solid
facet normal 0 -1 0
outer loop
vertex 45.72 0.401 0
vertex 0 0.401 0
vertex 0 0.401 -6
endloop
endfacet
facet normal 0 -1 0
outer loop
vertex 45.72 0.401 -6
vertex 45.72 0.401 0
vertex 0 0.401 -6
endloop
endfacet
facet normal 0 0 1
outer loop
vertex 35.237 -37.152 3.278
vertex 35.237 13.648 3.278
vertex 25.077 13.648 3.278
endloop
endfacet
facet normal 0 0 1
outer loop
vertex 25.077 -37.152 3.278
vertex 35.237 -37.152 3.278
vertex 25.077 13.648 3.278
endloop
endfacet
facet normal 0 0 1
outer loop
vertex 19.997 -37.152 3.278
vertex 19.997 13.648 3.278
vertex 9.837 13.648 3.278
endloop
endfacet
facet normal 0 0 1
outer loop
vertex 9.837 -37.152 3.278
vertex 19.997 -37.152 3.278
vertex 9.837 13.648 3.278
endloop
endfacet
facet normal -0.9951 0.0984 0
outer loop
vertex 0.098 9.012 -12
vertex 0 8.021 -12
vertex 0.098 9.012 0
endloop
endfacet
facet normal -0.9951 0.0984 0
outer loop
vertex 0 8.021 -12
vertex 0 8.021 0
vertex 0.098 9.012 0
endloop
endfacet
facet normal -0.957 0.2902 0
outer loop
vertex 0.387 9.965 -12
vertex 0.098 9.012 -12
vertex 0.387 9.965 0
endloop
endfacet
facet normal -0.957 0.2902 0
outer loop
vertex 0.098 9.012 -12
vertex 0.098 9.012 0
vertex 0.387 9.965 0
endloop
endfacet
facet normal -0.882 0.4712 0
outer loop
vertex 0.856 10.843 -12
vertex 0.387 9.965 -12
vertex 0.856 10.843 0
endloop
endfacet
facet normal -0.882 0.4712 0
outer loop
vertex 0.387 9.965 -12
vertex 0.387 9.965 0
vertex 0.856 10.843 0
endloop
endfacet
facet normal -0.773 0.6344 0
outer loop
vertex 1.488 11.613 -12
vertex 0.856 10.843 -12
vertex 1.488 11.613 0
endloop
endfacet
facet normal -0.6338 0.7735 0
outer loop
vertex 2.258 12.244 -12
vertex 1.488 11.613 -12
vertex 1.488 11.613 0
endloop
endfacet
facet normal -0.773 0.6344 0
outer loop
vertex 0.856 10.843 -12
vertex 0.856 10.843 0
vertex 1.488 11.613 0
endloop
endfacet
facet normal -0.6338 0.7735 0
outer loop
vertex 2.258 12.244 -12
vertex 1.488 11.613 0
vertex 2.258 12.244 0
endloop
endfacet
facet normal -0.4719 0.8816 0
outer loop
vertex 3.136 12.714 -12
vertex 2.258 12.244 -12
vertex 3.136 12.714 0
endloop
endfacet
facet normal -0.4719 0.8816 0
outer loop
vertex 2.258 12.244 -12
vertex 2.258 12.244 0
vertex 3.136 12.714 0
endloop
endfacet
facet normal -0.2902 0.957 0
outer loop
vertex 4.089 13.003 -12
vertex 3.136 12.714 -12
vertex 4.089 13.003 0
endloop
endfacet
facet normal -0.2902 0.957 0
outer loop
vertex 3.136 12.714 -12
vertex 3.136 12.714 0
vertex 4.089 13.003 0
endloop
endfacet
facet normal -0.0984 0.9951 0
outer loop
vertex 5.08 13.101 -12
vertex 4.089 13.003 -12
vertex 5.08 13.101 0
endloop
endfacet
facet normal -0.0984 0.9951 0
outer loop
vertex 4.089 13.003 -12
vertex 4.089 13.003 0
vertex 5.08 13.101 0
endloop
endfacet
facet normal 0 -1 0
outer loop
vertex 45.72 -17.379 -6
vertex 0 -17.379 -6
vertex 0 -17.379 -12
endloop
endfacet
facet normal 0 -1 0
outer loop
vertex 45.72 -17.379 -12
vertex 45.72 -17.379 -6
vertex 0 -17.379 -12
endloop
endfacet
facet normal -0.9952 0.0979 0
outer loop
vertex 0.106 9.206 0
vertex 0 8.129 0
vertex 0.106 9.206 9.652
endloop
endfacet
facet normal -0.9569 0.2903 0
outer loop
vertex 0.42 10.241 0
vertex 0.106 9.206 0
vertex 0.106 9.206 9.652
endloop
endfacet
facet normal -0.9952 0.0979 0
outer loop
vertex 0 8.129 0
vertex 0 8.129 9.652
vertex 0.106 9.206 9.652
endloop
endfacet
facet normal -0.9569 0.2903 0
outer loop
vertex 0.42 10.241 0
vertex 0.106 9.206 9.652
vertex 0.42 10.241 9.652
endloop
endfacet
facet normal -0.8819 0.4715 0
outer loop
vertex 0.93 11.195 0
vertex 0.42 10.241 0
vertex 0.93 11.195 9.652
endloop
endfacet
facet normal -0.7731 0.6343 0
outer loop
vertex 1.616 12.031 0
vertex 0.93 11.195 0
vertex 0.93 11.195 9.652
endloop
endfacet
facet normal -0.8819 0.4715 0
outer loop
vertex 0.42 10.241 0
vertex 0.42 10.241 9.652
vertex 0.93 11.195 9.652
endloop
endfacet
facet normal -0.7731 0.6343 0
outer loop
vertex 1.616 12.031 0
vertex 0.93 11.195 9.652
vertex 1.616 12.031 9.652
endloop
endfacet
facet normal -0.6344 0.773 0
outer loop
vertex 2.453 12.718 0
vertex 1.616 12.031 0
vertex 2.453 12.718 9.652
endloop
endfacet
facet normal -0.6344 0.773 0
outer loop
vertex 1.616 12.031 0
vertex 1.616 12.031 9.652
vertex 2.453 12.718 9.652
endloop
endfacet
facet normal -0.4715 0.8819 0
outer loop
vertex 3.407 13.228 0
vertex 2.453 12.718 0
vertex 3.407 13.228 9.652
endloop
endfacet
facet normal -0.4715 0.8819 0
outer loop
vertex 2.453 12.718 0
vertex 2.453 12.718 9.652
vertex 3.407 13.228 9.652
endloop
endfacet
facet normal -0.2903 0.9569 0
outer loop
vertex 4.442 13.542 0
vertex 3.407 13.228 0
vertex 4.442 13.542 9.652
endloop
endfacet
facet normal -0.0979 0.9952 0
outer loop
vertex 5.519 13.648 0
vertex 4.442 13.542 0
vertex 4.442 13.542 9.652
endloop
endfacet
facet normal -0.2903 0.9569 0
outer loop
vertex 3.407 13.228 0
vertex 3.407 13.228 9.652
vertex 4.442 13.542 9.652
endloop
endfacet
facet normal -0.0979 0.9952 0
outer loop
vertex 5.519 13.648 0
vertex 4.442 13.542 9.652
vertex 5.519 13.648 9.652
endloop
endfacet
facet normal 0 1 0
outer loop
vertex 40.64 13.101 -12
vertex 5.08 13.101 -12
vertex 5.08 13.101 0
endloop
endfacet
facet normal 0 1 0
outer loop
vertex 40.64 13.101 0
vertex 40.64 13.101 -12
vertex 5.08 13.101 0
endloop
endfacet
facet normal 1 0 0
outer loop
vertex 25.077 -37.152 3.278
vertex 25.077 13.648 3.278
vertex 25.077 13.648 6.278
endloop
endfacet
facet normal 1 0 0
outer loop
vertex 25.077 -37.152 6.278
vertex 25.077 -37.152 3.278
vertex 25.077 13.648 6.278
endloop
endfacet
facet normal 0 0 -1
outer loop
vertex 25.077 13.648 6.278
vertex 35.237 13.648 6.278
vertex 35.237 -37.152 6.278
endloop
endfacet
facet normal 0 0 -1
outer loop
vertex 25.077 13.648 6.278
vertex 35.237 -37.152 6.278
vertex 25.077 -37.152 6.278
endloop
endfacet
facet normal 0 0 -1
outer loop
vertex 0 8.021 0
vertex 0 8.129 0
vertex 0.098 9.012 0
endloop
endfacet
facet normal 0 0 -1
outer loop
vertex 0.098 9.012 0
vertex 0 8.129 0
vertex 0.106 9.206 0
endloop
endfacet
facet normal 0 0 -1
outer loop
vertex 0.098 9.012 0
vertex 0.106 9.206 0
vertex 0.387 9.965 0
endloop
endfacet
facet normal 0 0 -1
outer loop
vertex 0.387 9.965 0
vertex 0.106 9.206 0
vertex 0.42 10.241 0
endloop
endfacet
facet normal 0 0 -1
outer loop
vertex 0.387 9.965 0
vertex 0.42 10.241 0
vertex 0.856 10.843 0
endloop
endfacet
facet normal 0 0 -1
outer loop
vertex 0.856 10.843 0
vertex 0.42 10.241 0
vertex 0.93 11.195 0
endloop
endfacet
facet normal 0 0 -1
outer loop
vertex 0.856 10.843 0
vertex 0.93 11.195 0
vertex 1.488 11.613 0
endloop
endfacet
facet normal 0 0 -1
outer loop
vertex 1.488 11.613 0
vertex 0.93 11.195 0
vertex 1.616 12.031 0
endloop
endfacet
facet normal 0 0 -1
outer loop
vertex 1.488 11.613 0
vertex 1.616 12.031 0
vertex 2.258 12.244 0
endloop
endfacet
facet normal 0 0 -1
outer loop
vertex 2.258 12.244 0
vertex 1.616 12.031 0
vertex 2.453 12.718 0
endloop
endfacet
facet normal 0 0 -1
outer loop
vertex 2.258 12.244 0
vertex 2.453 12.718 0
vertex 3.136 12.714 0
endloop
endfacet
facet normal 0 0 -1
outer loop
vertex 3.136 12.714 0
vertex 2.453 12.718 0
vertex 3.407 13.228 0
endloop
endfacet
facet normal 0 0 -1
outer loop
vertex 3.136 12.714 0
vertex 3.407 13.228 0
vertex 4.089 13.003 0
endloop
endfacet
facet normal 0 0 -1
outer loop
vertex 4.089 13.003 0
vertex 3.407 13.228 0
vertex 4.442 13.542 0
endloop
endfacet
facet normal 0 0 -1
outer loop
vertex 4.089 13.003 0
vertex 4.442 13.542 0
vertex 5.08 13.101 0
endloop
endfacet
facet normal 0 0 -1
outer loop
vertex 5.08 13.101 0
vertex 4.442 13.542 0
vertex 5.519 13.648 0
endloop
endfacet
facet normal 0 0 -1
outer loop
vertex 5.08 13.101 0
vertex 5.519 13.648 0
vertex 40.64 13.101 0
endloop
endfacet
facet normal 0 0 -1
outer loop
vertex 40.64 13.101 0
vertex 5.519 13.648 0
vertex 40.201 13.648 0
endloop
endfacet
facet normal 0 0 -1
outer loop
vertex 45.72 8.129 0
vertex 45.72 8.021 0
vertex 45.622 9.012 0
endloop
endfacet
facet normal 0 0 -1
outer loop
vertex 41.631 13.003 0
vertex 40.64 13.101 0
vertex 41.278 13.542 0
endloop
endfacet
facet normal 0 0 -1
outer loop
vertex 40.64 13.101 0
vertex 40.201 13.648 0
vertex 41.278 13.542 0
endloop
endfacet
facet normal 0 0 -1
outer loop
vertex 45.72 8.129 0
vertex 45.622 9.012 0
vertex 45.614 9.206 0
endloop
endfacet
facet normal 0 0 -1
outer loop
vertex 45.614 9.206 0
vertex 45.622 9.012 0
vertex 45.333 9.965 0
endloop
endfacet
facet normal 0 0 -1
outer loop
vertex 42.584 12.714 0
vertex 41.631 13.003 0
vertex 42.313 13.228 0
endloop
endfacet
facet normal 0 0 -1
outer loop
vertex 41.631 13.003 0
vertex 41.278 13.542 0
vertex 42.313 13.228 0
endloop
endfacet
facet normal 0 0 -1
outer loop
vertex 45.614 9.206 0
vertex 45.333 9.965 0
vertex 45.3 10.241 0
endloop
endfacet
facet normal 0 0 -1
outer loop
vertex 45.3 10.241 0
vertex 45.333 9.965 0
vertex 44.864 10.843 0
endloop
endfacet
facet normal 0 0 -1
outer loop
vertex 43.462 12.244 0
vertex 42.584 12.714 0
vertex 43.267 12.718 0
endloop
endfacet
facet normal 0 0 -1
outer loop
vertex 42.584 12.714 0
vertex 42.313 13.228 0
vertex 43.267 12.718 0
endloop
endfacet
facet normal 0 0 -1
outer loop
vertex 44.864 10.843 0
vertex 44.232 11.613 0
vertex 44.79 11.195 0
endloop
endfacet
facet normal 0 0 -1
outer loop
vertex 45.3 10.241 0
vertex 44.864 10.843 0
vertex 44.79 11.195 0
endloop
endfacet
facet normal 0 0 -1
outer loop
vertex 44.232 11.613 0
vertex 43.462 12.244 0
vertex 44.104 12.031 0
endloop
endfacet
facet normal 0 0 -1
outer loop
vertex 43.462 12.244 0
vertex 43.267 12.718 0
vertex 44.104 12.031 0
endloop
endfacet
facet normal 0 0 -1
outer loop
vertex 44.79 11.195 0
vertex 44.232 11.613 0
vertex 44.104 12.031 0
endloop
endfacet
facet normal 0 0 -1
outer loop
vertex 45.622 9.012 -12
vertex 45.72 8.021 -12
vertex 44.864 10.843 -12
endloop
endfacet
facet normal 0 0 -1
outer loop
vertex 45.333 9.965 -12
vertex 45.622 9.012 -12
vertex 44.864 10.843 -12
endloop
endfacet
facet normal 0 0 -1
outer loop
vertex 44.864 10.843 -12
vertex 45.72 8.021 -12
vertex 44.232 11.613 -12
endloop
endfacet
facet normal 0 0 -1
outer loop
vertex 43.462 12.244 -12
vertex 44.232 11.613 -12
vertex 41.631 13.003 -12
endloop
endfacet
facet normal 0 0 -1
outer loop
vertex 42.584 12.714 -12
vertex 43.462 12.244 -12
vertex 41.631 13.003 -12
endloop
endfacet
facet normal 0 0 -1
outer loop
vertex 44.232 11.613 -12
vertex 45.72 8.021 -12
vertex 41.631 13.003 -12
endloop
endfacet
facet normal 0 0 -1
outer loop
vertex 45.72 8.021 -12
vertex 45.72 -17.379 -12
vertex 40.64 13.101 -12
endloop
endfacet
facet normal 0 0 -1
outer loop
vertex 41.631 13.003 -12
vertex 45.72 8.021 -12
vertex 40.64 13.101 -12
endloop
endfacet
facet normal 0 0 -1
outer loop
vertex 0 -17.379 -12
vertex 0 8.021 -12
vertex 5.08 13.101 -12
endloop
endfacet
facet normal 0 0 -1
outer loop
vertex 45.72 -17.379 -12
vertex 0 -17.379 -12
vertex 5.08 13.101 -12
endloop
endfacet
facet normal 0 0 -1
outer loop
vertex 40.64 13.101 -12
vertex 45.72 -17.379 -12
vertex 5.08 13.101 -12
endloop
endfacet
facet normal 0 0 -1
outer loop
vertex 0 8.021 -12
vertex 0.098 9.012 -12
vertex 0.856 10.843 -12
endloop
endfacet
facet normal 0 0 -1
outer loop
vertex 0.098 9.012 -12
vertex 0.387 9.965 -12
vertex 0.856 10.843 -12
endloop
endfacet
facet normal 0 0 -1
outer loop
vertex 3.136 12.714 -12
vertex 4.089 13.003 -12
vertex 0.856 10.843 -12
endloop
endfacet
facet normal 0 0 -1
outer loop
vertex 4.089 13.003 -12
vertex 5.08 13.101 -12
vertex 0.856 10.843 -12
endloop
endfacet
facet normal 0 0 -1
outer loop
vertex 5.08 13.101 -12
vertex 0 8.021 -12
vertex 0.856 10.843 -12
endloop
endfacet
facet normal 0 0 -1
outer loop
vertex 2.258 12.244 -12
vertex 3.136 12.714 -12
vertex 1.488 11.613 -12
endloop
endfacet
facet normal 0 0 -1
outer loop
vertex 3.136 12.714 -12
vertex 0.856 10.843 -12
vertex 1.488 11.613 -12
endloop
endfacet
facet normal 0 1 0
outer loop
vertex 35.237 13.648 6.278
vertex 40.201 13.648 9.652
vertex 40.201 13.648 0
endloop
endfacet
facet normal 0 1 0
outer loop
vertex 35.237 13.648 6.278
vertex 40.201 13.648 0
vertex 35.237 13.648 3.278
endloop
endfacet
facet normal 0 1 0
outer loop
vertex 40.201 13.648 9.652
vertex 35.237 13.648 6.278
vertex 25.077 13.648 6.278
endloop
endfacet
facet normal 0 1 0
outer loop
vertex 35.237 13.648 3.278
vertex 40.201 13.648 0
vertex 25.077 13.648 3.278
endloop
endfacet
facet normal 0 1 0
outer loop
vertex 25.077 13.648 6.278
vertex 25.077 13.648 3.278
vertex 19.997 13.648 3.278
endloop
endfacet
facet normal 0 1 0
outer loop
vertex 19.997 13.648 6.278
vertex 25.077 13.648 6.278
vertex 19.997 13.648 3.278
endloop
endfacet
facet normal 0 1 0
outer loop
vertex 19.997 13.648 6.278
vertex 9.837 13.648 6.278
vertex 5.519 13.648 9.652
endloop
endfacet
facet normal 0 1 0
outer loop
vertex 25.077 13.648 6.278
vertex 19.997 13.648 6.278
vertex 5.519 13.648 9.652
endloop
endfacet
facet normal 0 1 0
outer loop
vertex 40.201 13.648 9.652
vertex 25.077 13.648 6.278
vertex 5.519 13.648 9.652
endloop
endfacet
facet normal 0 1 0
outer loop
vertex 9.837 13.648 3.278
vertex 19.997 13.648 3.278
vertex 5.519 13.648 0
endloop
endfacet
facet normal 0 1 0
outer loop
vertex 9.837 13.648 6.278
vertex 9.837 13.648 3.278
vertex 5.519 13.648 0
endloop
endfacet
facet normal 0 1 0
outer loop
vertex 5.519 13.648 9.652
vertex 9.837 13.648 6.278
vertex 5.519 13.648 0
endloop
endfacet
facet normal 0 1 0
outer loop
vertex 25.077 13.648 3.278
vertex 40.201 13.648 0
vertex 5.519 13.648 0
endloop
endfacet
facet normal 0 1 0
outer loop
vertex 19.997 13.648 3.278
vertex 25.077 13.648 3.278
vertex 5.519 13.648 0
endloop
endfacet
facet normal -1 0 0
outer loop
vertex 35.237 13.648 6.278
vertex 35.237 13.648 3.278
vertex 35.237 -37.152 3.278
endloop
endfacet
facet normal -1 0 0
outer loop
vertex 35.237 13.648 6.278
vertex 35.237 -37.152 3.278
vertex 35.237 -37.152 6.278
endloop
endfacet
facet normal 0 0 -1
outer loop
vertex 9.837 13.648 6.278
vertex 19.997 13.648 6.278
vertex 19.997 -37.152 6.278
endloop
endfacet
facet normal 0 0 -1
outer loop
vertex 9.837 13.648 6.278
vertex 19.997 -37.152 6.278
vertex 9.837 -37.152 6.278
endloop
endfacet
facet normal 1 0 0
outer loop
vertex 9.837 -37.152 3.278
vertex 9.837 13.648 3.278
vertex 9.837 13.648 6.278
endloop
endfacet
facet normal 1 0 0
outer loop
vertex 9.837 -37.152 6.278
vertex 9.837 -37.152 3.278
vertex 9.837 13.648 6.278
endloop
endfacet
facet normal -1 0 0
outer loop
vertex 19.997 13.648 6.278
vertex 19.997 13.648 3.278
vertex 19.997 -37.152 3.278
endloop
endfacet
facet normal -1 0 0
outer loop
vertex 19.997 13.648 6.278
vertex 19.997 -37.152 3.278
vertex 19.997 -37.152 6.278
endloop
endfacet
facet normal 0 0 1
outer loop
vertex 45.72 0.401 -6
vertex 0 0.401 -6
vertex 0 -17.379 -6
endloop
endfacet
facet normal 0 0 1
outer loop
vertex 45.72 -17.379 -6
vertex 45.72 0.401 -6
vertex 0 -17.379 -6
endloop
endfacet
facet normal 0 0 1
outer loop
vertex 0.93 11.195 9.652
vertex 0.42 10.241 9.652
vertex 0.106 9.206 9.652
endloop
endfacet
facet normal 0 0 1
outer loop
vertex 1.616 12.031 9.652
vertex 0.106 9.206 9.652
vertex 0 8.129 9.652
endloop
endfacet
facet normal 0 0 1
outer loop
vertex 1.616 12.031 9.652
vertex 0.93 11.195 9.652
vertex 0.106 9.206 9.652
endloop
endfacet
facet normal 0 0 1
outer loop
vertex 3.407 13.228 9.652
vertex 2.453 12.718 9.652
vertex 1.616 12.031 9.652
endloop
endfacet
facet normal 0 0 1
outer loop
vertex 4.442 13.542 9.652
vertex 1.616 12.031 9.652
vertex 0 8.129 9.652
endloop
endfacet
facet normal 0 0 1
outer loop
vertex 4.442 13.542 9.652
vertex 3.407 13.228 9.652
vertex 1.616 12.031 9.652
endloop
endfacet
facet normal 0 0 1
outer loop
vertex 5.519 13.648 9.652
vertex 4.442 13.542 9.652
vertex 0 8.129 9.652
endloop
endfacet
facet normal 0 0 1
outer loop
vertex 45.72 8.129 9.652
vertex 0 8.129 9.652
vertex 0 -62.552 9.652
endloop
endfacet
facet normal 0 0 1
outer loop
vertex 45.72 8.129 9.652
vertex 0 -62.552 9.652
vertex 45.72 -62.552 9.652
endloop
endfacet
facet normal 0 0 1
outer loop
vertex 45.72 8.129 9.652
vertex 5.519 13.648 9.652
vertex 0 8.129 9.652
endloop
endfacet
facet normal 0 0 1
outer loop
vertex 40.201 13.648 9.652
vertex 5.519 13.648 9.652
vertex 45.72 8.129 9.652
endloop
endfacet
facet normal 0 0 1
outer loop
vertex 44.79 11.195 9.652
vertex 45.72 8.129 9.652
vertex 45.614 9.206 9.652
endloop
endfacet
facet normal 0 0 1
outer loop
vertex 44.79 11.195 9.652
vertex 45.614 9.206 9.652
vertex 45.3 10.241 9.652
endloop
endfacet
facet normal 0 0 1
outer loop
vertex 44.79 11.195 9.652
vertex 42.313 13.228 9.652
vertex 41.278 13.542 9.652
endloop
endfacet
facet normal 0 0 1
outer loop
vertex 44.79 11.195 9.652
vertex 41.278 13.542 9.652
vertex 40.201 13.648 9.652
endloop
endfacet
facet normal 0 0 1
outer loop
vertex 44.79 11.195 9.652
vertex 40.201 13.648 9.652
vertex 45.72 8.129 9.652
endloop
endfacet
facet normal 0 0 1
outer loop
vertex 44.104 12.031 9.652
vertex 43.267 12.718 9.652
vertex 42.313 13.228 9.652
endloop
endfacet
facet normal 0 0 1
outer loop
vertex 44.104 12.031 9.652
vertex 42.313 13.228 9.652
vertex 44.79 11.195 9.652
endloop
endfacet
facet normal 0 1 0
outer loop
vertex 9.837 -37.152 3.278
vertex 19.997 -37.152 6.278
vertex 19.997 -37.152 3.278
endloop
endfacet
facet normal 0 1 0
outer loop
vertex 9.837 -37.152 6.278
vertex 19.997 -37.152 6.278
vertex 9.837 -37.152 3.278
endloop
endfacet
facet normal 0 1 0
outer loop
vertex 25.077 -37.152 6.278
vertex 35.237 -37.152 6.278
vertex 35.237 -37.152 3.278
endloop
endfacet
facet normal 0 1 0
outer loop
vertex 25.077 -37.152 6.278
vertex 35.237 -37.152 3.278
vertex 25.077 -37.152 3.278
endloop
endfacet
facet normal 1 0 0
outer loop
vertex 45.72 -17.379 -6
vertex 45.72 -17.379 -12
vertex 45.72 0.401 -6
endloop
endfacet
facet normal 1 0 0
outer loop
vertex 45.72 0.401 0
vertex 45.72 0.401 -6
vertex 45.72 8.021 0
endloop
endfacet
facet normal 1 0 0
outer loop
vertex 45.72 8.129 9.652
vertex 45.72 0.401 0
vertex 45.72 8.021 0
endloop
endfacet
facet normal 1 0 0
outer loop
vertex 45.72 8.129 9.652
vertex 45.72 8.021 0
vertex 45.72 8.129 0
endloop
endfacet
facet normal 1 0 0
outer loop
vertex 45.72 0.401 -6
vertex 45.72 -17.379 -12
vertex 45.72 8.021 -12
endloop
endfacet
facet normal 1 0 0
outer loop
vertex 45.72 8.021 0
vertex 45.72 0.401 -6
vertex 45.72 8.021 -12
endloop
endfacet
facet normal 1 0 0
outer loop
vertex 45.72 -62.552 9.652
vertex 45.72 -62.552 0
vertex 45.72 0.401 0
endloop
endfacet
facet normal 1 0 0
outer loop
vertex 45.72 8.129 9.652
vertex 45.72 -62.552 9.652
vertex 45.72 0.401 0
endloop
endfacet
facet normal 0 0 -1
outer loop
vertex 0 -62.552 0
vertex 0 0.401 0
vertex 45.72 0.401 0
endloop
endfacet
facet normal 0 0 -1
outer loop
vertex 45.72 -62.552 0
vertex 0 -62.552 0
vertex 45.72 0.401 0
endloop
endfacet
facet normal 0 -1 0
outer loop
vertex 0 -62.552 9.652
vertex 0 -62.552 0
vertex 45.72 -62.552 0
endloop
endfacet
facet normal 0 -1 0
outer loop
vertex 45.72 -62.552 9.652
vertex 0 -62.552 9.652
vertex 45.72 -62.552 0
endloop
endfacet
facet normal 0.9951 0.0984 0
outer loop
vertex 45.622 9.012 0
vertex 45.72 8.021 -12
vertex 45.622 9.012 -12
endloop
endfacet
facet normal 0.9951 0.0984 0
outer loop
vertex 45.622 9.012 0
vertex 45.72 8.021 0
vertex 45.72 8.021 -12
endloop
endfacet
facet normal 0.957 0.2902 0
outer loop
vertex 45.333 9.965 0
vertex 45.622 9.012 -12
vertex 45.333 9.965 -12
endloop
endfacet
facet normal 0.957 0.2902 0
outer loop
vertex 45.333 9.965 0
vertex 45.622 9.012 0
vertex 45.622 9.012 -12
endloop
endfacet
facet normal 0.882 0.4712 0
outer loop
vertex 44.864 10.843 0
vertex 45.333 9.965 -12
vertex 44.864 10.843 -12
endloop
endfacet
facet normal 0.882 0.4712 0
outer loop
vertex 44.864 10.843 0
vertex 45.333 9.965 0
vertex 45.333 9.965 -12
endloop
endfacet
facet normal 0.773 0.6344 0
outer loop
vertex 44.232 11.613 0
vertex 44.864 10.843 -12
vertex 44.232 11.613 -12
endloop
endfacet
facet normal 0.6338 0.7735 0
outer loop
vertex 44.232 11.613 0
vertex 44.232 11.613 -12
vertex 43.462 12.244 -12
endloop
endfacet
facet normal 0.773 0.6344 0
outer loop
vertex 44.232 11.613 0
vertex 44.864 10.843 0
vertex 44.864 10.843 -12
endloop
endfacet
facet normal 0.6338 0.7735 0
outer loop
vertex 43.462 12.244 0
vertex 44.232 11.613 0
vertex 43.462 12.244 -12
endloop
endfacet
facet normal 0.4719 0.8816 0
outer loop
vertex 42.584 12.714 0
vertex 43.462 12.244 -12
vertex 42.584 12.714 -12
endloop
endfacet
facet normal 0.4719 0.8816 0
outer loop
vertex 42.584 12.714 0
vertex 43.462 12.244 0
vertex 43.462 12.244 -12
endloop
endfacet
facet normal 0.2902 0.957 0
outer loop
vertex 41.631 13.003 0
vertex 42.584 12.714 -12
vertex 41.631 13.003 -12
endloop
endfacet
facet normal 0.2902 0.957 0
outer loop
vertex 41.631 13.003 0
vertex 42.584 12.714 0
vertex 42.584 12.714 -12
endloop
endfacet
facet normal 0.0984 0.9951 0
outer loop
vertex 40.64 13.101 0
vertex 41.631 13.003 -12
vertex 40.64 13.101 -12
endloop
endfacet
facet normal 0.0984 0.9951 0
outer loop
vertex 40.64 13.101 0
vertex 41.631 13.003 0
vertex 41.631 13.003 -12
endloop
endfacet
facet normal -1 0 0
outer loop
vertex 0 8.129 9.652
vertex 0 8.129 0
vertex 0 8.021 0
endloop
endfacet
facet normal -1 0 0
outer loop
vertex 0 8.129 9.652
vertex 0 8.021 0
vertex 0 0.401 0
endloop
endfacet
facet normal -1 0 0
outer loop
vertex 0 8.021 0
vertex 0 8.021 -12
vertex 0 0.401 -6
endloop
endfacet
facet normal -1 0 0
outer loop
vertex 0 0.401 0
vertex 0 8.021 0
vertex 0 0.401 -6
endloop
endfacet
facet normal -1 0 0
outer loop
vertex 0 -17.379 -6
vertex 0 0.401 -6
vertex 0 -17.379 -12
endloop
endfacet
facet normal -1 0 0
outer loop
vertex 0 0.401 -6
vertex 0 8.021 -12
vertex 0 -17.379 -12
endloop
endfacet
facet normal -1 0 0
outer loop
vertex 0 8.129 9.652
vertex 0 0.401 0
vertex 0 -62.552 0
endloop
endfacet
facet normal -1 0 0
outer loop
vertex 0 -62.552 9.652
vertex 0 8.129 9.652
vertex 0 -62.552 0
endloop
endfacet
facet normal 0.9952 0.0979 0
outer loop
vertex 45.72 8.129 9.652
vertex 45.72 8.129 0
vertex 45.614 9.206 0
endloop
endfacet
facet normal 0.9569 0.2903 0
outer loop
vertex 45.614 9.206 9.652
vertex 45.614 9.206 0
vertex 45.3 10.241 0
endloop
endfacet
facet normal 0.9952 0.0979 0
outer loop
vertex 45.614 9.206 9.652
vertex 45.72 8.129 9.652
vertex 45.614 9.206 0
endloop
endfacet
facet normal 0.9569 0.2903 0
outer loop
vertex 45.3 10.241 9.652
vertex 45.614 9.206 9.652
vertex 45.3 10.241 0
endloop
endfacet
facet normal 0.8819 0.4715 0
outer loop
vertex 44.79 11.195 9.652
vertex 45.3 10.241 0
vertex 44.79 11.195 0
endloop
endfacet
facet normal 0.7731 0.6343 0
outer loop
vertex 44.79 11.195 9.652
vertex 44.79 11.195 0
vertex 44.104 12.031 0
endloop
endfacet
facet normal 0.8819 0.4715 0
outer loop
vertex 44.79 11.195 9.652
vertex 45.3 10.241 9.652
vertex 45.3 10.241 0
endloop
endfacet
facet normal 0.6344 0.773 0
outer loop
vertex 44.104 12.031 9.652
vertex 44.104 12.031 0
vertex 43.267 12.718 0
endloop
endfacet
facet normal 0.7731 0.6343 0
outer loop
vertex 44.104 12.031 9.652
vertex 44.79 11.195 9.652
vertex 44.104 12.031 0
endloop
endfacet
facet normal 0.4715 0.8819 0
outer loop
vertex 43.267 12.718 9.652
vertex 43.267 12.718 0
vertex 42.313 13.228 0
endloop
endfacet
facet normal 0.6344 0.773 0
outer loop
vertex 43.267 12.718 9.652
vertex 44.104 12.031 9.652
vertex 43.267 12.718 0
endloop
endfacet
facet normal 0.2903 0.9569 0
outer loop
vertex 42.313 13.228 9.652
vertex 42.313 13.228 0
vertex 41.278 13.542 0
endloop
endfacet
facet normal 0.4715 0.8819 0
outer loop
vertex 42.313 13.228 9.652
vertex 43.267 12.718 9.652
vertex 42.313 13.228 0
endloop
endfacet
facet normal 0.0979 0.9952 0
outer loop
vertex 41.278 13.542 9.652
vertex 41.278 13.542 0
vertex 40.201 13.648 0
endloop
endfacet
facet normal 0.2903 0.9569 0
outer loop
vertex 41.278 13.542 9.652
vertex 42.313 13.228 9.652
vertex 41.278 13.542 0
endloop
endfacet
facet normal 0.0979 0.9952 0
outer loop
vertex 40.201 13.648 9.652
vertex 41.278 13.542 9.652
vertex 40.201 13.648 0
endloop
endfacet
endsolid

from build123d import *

# Parameters (mm, degrees)
F1_DEPTH = 9.652
F4_DEPTH = 45.72
F5_R     = 5.08
F6_R     = 5.518892
F7_W     = 10.16
F7_H     = 3
F8_DEPTH = 50.8


with BuildPart() as f1:
    # F0 (on Top) → F1 (new body)
    with BuildSketch(Plane.XY):
        Polygon((0, 13.647766), (0, 0), (0, -62.552234), (45.72, -62.552234), (45.72, 13.647766), align=None)
    extrude(amount=F1_DEPTH)

    # F3 (on Right) → F4 (join)
    with BuildSketch(Plane.YZ):
        Polygon((13.10063, -12), (13.10063, 0), (0.40063, 0), (0.40063, -6), (-17.37937, -6), (-17.37937, -12), align=None)
    extrude(amount=F4_DEPTH)

    # F5
    f5_edges = [f1.edges().sort_by_distance(p)[0] for p in [
        (45.72, 13.10063, -6),
        (0, 13.10063, -6),
    ]]
    fillet(f5_edges, radius=F5_R)

    # F6
    f6_edges = [f1.edges().sort_by_distance(p)[0] for p in [
        (45.72, 13.647766, 4.826),
        (0, 13.647766, 4.826),
    ]]
    fillet(f6_edges, radius=F6_R)

    # F7 (on face) → F8 (cut)
    with BuildSketch(Plane(origin=(0, 13.647766, 0), x_dir=(-1, 0, 0), z_dir=(0, 1, 0))):
        with Locations((-30.156892, 4.777829)):
            Rectangle(F7_W, F7_H)
        with Locations((-14.916892, 4.777829)):
            Rectangle(F7_W, F7_H)
    extrude(amount=-F8_DEPTH, mode=Mode.SUBTRACT)


solid = f1.part
